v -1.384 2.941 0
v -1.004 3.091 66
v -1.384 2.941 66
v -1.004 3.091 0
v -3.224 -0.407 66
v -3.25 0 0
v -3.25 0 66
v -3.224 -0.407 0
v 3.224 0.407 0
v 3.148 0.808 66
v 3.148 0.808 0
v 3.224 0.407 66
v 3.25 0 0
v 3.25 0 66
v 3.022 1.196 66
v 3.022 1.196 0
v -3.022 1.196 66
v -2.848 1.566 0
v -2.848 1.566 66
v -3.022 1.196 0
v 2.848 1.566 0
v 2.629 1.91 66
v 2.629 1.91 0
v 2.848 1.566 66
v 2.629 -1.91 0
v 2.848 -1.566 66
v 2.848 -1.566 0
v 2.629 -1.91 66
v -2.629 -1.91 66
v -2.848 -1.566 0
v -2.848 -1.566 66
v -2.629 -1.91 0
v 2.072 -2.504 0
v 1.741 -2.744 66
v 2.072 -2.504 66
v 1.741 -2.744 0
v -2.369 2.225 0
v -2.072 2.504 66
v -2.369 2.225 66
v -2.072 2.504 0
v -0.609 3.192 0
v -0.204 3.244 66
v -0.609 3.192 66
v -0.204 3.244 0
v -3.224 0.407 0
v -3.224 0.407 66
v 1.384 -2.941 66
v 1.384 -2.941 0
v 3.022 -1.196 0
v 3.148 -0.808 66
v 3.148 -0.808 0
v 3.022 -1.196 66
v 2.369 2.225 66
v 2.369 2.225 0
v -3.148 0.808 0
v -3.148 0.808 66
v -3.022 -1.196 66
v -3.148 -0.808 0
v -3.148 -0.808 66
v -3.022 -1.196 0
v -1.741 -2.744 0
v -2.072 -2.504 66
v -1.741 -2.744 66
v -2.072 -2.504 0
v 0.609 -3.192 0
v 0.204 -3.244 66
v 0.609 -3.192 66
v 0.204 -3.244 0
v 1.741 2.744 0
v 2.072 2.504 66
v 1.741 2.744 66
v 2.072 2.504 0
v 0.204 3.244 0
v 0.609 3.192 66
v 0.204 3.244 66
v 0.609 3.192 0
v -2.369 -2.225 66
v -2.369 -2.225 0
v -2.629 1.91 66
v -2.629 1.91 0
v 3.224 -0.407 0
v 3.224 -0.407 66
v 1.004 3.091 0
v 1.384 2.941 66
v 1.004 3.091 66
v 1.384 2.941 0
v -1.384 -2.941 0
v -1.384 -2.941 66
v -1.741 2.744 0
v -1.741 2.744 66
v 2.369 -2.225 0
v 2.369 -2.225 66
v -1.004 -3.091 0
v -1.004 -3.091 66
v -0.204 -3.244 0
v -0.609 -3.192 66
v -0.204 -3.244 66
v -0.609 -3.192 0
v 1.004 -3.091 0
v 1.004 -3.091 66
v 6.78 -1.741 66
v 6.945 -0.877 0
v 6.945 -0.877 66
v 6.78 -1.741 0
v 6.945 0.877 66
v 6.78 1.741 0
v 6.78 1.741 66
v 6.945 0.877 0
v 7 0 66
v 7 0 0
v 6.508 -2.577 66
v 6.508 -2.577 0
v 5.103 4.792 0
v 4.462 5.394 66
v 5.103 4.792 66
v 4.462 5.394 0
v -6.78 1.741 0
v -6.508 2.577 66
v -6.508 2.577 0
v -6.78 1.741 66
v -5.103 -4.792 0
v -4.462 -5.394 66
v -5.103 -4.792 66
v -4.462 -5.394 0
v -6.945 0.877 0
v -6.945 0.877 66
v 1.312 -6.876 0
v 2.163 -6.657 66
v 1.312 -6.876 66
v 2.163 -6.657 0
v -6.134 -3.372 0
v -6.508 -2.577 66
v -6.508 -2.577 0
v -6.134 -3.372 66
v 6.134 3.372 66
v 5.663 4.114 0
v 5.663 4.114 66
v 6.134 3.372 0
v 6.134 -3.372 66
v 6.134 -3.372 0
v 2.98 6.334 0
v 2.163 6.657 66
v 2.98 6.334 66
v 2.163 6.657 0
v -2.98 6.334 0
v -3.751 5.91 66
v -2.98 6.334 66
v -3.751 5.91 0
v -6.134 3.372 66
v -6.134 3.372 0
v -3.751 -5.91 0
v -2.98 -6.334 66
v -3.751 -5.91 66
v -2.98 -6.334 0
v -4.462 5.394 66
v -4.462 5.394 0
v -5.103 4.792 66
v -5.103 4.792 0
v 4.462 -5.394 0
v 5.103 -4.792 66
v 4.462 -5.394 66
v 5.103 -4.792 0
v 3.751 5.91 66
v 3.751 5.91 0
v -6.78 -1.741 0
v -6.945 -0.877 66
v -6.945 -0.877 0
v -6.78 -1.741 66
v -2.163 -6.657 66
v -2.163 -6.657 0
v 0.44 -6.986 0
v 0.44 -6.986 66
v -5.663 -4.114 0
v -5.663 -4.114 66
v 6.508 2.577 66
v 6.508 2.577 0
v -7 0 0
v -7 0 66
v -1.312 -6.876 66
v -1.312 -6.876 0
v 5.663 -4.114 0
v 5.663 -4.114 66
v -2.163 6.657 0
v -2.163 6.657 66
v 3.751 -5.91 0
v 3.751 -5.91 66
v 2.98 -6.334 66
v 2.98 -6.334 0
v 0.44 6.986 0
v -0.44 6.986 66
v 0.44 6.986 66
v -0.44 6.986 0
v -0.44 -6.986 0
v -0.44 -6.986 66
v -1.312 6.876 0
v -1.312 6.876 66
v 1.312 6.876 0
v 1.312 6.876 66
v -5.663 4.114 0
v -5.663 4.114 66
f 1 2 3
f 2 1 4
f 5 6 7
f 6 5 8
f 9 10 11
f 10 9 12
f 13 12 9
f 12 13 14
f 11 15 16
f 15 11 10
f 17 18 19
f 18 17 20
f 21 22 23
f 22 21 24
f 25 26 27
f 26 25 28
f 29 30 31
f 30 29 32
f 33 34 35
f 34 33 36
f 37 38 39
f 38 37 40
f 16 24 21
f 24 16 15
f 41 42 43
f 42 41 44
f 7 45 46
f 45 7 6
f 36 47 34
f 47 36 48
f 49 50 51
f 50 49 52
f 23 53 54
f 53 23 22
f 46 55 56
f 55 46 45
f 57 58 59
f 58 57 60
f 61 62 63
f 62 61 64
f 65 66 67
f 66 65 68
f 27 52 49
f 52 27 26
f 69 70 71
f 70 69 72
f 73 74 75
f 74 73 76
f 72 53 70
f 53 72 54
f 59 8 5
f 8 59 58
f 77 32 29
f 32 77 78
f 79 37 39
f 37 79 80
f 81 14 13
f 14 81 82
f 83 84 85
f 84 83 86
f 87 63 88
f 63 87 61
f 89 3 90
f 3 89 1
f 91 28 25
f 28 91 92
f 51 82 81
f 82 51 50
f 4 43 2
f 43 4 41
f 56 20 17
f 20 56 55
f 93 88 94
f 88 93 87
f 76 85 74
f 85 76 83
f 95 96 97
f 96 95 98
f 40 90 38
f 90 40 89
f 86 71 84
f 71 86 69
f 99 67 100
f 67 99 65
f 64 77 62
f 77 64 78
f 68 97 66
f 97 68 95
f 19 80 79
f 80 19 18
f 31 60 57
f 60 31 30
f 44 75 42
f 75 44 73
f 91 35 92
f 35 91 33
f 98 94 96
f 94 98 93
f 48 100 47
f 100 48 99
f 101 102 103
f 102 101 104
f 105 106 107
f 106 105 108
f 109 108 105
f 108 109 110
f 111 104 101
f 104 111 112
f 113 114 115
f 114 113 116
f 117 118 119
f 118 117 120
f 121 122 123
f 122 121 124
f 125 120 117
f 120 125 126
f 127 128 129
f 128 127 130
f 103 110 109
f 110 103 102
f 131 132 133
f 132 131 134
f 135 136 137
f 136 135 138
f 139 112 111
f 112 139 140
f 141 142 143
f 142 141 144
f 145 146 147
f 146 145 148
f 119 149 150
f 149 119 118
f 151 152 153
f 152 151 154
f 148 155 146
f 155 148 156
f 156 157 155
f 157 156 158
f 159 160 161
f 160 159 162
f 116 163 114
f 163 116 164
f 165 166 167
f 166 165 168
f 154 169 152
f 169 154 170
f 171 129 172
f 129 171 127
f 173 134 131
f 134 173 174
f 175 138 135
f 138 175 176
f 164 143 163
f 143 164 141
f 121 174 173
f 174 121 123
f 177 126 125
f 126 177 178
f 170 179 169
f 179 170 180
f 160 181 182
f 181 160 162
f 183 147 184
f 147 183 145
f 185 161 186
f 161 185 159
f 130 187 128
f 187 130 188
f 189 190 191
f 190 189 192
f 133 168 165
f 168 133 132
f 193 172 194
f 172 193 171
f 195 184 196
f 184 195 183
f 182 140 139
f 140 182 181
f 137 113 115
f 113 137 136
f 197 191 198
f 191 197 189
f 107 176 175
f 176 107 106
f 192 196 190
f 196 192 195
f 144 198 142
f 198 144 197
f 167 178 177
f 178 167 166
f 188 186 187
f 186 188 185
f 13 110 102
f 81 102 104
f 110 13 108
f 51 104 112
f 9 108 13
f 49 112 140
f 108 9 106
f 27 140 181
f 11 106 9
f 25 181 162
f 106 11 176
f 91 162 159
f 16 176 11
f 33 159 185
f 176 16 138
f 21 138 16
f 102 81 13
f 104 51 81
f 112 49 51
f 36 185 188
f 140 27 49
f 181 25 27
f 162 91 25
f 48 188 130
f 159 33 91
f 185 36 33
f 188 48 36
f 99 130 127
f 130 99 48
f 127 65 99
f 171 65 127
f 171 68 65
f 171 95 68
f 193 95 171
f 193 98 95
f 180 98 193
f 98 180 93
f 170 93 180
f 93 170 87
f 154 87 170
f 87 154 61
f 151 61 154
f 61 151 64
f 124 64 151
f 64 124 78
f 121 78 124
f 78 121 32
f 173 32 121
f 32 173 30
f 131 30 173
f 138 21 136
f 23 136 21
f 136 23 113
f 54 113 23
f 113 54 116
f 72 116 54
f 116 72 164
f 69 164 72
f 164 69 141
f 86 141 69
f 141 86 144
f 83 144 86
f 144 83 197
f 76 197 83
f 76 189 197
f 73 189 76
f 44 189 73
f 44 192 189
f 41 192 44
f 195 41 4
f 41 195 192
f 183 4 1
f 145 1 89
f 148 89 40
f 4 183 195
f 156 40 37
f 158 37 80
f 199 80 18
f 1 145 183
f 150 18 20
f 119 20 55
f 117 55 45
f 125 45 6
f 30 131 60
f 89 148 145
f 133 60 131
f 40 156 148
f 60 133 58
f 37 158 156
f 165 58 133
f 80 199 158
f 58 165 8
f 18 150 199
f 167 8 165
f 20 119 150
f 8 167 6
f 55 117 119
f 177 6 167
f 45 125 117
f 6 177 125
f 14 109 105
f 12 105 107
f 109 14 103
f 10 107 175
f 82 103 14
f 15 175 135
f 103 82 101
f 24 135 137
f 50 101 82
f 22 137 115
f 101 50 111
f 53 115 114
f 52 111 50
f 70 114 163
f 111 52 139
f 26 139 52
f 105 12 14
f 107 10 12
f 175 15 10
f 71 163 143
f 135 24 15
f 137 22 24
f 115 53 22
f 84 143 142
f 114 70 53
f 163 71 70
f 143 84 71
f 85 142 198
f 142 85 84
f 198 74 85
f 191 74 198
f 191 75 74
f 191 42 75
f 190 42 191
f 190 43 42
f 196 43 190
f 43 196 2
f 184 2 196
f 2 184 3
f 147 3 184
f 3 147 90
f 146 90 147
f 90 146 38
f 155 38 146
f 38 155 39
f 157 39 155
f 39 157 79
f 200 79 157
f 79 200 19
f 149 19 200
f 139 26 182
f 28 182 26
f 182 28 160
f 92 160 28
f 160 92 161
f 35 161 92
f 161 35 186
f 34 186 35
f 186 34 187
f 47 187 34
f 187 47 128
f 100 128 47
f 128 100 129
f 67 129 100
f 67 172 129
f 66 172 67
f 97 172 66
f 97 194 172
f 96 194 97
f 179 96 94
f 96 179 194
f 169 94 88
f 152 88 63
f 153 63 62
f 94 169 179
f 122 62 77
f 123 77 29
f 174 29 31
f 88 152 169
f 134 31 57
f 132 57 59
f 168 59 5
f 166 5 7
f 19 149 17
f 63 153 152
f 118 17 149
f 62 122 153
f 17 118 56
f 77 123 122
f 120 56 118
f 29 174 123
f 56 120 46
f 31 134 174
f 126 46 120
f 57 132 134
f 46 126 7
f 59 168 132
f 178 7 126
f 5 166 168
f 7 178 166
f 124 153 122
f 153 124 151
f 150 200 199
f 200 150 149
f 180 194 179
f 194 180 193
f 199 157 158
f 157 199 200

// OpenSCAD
$fn = 50;


difference() {
	union() {
		cylinder(h = 66, r = 7.0000000000);
	}
	union() {
		translate(v = [0.0000000000, 0.0000000000, -100.0000000000]) {
			cylinder(h = 200, r = 3.2500000000);
		}
		cylinder(h = 66, r = 1.8000000000);
		cylinder(h = 66, r = 1.8000000000);
		cylinder(h = 66, r = 1.8000000000);
	}
}
